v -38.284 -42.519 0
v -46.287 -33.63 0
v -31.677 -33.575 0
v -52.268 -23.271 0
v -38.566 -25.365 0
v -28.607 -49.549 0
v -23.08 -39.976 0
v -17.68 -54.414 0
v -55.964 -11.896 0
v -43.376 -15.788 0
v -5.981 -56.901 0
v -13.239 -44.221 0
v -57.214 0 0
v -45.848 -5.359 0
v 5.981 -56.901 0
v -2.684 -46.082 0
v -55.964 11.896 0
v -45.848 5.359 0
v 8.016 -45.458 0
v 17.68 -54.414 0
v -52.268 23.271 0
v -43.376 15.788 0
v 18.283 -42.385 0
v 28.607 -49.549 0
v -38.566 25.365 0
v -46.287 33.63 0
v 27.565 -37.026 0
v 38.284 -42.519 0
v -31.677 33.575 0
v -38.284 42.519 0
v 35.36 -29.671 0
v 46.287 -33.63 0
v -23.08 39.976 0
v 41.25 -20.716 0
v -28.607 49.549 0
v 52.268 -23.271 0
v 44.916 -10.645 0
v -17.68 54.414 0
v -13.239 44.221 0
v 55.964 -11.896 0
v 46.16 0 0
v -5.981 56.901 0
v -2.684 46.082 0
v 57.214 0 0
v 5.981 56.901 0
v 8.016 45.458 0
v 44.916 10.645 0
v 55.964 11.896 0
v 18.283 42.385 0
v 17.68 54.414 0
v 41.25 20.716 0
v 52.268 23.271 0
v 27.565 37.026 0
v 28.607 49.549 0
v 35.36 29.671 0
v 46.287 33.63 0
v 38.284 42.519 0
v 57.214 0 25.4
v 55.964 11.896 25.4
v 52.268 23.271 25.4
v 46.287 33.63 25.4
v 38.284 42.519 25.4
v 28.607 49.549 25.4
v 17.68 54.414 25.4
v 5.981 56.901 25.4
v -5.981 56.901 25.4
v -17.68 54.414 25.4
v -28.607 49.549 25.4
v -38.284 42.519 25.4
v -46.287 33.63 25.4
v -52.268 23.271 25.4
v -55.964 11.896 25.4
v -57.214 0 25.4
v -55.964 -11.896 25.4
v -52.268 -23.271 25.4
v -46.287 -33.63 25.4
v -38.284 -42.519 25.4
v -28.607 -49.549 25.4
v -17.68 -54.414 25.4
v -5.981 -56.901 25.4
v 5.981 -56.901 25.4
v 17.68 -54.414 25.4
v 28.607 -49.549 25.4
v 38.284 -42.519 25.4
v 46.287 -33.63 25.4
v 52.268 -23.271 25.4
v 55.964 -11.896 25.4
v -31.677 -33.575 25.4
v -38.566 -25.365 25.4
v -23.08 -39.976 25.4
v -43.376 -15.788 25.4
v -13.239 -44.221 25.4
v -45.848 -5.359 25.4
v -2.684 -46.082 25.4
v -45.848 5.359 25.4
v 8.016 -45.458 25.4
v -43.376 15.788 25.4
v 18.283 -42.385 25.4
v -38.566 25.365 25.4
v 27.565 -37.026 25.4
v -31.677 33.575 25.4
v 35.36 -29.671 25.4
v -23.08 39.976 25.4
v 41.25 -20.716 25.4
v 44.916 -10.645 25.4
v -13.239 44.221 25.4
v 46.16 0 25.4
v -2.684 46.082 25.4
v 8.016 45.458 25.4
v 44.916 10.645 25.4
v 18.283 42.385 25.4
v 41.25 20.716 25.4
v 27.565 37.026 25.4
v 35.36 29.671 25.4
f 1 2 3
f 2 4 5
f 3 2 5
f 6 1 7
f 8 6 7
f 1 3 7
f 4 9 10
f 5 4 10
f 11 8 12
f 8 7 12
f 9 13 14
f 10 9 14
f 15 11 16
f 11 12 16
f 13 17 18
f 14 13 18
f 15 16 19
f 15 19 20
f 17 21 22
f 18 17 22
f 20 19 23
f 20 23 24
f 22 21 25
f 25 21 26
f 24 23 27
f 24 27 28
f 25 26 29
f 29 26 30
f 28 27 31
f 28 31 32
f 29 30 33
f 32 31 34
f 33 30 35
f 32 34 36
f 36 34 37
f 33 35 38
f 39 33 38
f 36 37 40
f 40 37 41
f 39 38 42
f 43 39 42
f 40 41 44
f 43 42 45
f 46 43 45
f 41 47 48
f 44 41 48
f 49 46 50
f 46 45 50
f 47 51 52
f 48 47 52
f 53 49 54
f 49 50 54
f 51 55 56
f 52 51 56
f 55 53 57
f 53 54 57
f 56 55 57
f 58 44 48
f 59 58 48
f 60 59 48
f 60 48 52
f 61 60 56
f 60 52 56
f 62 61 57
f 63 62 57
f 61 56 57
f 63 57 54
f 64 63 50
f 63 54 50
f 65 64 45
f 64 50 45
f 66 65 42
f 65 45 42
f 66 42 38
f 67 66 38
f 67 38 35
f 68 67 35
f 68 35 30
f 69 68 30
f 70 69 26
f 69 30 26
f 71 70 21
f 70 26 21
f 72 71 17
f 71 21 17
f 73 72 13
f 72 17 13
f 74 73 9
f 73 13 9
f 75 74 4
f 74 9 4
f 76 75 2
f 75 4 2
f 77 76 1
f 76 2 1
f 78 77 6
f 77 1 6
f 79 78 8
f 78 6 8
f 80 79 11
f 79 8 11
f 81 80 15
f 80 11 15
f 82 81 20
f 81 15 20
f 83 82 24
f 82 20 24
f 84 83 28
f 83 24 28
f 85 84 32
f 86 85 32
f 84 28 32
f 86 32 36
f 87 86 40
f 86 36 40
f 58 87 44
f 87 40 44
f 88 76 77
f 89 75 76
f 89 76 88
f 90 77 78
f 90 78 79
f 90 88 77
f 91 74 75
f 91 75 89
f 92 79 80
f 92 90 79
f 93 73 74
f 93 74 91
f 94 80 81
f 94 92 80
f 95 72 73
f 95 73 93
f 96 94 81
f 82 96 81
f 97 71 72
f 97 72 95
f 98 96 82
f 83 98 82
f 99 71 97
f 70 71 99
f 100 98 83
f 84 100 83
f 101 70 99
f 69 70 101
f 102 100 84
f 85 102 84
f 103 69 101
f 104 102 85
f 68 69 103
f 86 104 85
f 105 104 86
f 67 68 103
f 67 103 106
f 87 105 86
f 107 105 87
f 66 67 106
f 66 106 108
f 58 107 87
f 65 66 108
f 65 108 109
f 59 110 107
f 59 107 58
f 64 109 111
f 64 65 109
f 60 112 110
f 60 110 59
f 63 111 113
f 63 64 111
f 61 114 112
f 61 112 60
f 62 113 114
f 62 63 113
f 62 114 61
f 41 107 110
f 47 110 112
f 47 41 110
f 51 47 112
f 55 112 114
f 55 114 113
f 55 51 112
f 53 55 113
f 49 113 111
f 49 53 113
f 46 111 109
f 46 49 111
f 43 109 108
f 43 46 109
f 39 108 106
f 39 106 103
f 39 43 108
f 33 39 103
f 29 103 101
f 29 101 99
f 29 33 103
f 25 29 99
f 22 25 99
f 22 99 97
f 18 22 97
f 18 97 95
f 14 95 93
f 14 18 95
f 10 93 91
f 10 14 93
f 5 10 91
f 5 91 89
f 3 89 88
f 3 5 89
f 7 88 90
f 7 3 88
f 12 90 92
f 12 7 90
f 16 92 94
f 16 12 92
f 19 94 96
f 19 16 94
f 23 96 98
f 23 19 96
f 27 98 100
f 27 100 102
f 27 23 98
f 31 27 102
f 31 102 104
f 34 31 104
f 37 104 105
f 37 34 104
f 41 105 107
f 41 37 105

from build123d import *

# Parameters (mm, degrees)
F0_R     = 57.21436
F1_DEPTH = 25.4
F2_R     = 46.159754
F3_DEPTH = 25.4
F4_W     = 13.088044
F4_H     = 22.873998
F5_DEPTH = 25.4


with BuildPart() as f1:
    # F0 (on Top) → F1 (new body)
    with BuildSketch(Plane.XY):
        Circle(F0_R)
    extrude(amount=F1_DEPTH)

    # F2 (on Top) → F3 (cut)
    with BuildSketch(Plane.XY):
        Circle(F2_R)
    extrude(amount=F3_DEPTH, mode=Mode.SUBTRACT)

    # F4 (on Top) → F5 (cut)
    with BuildSketch(Plane.XY):
        with Locations((0, 182.986438)):
            Rectangle(F4_W, F4_H)
    extrude(amount=F5_DEPTH, mode=Mode.SUBTRACT)


solid = f1.part
